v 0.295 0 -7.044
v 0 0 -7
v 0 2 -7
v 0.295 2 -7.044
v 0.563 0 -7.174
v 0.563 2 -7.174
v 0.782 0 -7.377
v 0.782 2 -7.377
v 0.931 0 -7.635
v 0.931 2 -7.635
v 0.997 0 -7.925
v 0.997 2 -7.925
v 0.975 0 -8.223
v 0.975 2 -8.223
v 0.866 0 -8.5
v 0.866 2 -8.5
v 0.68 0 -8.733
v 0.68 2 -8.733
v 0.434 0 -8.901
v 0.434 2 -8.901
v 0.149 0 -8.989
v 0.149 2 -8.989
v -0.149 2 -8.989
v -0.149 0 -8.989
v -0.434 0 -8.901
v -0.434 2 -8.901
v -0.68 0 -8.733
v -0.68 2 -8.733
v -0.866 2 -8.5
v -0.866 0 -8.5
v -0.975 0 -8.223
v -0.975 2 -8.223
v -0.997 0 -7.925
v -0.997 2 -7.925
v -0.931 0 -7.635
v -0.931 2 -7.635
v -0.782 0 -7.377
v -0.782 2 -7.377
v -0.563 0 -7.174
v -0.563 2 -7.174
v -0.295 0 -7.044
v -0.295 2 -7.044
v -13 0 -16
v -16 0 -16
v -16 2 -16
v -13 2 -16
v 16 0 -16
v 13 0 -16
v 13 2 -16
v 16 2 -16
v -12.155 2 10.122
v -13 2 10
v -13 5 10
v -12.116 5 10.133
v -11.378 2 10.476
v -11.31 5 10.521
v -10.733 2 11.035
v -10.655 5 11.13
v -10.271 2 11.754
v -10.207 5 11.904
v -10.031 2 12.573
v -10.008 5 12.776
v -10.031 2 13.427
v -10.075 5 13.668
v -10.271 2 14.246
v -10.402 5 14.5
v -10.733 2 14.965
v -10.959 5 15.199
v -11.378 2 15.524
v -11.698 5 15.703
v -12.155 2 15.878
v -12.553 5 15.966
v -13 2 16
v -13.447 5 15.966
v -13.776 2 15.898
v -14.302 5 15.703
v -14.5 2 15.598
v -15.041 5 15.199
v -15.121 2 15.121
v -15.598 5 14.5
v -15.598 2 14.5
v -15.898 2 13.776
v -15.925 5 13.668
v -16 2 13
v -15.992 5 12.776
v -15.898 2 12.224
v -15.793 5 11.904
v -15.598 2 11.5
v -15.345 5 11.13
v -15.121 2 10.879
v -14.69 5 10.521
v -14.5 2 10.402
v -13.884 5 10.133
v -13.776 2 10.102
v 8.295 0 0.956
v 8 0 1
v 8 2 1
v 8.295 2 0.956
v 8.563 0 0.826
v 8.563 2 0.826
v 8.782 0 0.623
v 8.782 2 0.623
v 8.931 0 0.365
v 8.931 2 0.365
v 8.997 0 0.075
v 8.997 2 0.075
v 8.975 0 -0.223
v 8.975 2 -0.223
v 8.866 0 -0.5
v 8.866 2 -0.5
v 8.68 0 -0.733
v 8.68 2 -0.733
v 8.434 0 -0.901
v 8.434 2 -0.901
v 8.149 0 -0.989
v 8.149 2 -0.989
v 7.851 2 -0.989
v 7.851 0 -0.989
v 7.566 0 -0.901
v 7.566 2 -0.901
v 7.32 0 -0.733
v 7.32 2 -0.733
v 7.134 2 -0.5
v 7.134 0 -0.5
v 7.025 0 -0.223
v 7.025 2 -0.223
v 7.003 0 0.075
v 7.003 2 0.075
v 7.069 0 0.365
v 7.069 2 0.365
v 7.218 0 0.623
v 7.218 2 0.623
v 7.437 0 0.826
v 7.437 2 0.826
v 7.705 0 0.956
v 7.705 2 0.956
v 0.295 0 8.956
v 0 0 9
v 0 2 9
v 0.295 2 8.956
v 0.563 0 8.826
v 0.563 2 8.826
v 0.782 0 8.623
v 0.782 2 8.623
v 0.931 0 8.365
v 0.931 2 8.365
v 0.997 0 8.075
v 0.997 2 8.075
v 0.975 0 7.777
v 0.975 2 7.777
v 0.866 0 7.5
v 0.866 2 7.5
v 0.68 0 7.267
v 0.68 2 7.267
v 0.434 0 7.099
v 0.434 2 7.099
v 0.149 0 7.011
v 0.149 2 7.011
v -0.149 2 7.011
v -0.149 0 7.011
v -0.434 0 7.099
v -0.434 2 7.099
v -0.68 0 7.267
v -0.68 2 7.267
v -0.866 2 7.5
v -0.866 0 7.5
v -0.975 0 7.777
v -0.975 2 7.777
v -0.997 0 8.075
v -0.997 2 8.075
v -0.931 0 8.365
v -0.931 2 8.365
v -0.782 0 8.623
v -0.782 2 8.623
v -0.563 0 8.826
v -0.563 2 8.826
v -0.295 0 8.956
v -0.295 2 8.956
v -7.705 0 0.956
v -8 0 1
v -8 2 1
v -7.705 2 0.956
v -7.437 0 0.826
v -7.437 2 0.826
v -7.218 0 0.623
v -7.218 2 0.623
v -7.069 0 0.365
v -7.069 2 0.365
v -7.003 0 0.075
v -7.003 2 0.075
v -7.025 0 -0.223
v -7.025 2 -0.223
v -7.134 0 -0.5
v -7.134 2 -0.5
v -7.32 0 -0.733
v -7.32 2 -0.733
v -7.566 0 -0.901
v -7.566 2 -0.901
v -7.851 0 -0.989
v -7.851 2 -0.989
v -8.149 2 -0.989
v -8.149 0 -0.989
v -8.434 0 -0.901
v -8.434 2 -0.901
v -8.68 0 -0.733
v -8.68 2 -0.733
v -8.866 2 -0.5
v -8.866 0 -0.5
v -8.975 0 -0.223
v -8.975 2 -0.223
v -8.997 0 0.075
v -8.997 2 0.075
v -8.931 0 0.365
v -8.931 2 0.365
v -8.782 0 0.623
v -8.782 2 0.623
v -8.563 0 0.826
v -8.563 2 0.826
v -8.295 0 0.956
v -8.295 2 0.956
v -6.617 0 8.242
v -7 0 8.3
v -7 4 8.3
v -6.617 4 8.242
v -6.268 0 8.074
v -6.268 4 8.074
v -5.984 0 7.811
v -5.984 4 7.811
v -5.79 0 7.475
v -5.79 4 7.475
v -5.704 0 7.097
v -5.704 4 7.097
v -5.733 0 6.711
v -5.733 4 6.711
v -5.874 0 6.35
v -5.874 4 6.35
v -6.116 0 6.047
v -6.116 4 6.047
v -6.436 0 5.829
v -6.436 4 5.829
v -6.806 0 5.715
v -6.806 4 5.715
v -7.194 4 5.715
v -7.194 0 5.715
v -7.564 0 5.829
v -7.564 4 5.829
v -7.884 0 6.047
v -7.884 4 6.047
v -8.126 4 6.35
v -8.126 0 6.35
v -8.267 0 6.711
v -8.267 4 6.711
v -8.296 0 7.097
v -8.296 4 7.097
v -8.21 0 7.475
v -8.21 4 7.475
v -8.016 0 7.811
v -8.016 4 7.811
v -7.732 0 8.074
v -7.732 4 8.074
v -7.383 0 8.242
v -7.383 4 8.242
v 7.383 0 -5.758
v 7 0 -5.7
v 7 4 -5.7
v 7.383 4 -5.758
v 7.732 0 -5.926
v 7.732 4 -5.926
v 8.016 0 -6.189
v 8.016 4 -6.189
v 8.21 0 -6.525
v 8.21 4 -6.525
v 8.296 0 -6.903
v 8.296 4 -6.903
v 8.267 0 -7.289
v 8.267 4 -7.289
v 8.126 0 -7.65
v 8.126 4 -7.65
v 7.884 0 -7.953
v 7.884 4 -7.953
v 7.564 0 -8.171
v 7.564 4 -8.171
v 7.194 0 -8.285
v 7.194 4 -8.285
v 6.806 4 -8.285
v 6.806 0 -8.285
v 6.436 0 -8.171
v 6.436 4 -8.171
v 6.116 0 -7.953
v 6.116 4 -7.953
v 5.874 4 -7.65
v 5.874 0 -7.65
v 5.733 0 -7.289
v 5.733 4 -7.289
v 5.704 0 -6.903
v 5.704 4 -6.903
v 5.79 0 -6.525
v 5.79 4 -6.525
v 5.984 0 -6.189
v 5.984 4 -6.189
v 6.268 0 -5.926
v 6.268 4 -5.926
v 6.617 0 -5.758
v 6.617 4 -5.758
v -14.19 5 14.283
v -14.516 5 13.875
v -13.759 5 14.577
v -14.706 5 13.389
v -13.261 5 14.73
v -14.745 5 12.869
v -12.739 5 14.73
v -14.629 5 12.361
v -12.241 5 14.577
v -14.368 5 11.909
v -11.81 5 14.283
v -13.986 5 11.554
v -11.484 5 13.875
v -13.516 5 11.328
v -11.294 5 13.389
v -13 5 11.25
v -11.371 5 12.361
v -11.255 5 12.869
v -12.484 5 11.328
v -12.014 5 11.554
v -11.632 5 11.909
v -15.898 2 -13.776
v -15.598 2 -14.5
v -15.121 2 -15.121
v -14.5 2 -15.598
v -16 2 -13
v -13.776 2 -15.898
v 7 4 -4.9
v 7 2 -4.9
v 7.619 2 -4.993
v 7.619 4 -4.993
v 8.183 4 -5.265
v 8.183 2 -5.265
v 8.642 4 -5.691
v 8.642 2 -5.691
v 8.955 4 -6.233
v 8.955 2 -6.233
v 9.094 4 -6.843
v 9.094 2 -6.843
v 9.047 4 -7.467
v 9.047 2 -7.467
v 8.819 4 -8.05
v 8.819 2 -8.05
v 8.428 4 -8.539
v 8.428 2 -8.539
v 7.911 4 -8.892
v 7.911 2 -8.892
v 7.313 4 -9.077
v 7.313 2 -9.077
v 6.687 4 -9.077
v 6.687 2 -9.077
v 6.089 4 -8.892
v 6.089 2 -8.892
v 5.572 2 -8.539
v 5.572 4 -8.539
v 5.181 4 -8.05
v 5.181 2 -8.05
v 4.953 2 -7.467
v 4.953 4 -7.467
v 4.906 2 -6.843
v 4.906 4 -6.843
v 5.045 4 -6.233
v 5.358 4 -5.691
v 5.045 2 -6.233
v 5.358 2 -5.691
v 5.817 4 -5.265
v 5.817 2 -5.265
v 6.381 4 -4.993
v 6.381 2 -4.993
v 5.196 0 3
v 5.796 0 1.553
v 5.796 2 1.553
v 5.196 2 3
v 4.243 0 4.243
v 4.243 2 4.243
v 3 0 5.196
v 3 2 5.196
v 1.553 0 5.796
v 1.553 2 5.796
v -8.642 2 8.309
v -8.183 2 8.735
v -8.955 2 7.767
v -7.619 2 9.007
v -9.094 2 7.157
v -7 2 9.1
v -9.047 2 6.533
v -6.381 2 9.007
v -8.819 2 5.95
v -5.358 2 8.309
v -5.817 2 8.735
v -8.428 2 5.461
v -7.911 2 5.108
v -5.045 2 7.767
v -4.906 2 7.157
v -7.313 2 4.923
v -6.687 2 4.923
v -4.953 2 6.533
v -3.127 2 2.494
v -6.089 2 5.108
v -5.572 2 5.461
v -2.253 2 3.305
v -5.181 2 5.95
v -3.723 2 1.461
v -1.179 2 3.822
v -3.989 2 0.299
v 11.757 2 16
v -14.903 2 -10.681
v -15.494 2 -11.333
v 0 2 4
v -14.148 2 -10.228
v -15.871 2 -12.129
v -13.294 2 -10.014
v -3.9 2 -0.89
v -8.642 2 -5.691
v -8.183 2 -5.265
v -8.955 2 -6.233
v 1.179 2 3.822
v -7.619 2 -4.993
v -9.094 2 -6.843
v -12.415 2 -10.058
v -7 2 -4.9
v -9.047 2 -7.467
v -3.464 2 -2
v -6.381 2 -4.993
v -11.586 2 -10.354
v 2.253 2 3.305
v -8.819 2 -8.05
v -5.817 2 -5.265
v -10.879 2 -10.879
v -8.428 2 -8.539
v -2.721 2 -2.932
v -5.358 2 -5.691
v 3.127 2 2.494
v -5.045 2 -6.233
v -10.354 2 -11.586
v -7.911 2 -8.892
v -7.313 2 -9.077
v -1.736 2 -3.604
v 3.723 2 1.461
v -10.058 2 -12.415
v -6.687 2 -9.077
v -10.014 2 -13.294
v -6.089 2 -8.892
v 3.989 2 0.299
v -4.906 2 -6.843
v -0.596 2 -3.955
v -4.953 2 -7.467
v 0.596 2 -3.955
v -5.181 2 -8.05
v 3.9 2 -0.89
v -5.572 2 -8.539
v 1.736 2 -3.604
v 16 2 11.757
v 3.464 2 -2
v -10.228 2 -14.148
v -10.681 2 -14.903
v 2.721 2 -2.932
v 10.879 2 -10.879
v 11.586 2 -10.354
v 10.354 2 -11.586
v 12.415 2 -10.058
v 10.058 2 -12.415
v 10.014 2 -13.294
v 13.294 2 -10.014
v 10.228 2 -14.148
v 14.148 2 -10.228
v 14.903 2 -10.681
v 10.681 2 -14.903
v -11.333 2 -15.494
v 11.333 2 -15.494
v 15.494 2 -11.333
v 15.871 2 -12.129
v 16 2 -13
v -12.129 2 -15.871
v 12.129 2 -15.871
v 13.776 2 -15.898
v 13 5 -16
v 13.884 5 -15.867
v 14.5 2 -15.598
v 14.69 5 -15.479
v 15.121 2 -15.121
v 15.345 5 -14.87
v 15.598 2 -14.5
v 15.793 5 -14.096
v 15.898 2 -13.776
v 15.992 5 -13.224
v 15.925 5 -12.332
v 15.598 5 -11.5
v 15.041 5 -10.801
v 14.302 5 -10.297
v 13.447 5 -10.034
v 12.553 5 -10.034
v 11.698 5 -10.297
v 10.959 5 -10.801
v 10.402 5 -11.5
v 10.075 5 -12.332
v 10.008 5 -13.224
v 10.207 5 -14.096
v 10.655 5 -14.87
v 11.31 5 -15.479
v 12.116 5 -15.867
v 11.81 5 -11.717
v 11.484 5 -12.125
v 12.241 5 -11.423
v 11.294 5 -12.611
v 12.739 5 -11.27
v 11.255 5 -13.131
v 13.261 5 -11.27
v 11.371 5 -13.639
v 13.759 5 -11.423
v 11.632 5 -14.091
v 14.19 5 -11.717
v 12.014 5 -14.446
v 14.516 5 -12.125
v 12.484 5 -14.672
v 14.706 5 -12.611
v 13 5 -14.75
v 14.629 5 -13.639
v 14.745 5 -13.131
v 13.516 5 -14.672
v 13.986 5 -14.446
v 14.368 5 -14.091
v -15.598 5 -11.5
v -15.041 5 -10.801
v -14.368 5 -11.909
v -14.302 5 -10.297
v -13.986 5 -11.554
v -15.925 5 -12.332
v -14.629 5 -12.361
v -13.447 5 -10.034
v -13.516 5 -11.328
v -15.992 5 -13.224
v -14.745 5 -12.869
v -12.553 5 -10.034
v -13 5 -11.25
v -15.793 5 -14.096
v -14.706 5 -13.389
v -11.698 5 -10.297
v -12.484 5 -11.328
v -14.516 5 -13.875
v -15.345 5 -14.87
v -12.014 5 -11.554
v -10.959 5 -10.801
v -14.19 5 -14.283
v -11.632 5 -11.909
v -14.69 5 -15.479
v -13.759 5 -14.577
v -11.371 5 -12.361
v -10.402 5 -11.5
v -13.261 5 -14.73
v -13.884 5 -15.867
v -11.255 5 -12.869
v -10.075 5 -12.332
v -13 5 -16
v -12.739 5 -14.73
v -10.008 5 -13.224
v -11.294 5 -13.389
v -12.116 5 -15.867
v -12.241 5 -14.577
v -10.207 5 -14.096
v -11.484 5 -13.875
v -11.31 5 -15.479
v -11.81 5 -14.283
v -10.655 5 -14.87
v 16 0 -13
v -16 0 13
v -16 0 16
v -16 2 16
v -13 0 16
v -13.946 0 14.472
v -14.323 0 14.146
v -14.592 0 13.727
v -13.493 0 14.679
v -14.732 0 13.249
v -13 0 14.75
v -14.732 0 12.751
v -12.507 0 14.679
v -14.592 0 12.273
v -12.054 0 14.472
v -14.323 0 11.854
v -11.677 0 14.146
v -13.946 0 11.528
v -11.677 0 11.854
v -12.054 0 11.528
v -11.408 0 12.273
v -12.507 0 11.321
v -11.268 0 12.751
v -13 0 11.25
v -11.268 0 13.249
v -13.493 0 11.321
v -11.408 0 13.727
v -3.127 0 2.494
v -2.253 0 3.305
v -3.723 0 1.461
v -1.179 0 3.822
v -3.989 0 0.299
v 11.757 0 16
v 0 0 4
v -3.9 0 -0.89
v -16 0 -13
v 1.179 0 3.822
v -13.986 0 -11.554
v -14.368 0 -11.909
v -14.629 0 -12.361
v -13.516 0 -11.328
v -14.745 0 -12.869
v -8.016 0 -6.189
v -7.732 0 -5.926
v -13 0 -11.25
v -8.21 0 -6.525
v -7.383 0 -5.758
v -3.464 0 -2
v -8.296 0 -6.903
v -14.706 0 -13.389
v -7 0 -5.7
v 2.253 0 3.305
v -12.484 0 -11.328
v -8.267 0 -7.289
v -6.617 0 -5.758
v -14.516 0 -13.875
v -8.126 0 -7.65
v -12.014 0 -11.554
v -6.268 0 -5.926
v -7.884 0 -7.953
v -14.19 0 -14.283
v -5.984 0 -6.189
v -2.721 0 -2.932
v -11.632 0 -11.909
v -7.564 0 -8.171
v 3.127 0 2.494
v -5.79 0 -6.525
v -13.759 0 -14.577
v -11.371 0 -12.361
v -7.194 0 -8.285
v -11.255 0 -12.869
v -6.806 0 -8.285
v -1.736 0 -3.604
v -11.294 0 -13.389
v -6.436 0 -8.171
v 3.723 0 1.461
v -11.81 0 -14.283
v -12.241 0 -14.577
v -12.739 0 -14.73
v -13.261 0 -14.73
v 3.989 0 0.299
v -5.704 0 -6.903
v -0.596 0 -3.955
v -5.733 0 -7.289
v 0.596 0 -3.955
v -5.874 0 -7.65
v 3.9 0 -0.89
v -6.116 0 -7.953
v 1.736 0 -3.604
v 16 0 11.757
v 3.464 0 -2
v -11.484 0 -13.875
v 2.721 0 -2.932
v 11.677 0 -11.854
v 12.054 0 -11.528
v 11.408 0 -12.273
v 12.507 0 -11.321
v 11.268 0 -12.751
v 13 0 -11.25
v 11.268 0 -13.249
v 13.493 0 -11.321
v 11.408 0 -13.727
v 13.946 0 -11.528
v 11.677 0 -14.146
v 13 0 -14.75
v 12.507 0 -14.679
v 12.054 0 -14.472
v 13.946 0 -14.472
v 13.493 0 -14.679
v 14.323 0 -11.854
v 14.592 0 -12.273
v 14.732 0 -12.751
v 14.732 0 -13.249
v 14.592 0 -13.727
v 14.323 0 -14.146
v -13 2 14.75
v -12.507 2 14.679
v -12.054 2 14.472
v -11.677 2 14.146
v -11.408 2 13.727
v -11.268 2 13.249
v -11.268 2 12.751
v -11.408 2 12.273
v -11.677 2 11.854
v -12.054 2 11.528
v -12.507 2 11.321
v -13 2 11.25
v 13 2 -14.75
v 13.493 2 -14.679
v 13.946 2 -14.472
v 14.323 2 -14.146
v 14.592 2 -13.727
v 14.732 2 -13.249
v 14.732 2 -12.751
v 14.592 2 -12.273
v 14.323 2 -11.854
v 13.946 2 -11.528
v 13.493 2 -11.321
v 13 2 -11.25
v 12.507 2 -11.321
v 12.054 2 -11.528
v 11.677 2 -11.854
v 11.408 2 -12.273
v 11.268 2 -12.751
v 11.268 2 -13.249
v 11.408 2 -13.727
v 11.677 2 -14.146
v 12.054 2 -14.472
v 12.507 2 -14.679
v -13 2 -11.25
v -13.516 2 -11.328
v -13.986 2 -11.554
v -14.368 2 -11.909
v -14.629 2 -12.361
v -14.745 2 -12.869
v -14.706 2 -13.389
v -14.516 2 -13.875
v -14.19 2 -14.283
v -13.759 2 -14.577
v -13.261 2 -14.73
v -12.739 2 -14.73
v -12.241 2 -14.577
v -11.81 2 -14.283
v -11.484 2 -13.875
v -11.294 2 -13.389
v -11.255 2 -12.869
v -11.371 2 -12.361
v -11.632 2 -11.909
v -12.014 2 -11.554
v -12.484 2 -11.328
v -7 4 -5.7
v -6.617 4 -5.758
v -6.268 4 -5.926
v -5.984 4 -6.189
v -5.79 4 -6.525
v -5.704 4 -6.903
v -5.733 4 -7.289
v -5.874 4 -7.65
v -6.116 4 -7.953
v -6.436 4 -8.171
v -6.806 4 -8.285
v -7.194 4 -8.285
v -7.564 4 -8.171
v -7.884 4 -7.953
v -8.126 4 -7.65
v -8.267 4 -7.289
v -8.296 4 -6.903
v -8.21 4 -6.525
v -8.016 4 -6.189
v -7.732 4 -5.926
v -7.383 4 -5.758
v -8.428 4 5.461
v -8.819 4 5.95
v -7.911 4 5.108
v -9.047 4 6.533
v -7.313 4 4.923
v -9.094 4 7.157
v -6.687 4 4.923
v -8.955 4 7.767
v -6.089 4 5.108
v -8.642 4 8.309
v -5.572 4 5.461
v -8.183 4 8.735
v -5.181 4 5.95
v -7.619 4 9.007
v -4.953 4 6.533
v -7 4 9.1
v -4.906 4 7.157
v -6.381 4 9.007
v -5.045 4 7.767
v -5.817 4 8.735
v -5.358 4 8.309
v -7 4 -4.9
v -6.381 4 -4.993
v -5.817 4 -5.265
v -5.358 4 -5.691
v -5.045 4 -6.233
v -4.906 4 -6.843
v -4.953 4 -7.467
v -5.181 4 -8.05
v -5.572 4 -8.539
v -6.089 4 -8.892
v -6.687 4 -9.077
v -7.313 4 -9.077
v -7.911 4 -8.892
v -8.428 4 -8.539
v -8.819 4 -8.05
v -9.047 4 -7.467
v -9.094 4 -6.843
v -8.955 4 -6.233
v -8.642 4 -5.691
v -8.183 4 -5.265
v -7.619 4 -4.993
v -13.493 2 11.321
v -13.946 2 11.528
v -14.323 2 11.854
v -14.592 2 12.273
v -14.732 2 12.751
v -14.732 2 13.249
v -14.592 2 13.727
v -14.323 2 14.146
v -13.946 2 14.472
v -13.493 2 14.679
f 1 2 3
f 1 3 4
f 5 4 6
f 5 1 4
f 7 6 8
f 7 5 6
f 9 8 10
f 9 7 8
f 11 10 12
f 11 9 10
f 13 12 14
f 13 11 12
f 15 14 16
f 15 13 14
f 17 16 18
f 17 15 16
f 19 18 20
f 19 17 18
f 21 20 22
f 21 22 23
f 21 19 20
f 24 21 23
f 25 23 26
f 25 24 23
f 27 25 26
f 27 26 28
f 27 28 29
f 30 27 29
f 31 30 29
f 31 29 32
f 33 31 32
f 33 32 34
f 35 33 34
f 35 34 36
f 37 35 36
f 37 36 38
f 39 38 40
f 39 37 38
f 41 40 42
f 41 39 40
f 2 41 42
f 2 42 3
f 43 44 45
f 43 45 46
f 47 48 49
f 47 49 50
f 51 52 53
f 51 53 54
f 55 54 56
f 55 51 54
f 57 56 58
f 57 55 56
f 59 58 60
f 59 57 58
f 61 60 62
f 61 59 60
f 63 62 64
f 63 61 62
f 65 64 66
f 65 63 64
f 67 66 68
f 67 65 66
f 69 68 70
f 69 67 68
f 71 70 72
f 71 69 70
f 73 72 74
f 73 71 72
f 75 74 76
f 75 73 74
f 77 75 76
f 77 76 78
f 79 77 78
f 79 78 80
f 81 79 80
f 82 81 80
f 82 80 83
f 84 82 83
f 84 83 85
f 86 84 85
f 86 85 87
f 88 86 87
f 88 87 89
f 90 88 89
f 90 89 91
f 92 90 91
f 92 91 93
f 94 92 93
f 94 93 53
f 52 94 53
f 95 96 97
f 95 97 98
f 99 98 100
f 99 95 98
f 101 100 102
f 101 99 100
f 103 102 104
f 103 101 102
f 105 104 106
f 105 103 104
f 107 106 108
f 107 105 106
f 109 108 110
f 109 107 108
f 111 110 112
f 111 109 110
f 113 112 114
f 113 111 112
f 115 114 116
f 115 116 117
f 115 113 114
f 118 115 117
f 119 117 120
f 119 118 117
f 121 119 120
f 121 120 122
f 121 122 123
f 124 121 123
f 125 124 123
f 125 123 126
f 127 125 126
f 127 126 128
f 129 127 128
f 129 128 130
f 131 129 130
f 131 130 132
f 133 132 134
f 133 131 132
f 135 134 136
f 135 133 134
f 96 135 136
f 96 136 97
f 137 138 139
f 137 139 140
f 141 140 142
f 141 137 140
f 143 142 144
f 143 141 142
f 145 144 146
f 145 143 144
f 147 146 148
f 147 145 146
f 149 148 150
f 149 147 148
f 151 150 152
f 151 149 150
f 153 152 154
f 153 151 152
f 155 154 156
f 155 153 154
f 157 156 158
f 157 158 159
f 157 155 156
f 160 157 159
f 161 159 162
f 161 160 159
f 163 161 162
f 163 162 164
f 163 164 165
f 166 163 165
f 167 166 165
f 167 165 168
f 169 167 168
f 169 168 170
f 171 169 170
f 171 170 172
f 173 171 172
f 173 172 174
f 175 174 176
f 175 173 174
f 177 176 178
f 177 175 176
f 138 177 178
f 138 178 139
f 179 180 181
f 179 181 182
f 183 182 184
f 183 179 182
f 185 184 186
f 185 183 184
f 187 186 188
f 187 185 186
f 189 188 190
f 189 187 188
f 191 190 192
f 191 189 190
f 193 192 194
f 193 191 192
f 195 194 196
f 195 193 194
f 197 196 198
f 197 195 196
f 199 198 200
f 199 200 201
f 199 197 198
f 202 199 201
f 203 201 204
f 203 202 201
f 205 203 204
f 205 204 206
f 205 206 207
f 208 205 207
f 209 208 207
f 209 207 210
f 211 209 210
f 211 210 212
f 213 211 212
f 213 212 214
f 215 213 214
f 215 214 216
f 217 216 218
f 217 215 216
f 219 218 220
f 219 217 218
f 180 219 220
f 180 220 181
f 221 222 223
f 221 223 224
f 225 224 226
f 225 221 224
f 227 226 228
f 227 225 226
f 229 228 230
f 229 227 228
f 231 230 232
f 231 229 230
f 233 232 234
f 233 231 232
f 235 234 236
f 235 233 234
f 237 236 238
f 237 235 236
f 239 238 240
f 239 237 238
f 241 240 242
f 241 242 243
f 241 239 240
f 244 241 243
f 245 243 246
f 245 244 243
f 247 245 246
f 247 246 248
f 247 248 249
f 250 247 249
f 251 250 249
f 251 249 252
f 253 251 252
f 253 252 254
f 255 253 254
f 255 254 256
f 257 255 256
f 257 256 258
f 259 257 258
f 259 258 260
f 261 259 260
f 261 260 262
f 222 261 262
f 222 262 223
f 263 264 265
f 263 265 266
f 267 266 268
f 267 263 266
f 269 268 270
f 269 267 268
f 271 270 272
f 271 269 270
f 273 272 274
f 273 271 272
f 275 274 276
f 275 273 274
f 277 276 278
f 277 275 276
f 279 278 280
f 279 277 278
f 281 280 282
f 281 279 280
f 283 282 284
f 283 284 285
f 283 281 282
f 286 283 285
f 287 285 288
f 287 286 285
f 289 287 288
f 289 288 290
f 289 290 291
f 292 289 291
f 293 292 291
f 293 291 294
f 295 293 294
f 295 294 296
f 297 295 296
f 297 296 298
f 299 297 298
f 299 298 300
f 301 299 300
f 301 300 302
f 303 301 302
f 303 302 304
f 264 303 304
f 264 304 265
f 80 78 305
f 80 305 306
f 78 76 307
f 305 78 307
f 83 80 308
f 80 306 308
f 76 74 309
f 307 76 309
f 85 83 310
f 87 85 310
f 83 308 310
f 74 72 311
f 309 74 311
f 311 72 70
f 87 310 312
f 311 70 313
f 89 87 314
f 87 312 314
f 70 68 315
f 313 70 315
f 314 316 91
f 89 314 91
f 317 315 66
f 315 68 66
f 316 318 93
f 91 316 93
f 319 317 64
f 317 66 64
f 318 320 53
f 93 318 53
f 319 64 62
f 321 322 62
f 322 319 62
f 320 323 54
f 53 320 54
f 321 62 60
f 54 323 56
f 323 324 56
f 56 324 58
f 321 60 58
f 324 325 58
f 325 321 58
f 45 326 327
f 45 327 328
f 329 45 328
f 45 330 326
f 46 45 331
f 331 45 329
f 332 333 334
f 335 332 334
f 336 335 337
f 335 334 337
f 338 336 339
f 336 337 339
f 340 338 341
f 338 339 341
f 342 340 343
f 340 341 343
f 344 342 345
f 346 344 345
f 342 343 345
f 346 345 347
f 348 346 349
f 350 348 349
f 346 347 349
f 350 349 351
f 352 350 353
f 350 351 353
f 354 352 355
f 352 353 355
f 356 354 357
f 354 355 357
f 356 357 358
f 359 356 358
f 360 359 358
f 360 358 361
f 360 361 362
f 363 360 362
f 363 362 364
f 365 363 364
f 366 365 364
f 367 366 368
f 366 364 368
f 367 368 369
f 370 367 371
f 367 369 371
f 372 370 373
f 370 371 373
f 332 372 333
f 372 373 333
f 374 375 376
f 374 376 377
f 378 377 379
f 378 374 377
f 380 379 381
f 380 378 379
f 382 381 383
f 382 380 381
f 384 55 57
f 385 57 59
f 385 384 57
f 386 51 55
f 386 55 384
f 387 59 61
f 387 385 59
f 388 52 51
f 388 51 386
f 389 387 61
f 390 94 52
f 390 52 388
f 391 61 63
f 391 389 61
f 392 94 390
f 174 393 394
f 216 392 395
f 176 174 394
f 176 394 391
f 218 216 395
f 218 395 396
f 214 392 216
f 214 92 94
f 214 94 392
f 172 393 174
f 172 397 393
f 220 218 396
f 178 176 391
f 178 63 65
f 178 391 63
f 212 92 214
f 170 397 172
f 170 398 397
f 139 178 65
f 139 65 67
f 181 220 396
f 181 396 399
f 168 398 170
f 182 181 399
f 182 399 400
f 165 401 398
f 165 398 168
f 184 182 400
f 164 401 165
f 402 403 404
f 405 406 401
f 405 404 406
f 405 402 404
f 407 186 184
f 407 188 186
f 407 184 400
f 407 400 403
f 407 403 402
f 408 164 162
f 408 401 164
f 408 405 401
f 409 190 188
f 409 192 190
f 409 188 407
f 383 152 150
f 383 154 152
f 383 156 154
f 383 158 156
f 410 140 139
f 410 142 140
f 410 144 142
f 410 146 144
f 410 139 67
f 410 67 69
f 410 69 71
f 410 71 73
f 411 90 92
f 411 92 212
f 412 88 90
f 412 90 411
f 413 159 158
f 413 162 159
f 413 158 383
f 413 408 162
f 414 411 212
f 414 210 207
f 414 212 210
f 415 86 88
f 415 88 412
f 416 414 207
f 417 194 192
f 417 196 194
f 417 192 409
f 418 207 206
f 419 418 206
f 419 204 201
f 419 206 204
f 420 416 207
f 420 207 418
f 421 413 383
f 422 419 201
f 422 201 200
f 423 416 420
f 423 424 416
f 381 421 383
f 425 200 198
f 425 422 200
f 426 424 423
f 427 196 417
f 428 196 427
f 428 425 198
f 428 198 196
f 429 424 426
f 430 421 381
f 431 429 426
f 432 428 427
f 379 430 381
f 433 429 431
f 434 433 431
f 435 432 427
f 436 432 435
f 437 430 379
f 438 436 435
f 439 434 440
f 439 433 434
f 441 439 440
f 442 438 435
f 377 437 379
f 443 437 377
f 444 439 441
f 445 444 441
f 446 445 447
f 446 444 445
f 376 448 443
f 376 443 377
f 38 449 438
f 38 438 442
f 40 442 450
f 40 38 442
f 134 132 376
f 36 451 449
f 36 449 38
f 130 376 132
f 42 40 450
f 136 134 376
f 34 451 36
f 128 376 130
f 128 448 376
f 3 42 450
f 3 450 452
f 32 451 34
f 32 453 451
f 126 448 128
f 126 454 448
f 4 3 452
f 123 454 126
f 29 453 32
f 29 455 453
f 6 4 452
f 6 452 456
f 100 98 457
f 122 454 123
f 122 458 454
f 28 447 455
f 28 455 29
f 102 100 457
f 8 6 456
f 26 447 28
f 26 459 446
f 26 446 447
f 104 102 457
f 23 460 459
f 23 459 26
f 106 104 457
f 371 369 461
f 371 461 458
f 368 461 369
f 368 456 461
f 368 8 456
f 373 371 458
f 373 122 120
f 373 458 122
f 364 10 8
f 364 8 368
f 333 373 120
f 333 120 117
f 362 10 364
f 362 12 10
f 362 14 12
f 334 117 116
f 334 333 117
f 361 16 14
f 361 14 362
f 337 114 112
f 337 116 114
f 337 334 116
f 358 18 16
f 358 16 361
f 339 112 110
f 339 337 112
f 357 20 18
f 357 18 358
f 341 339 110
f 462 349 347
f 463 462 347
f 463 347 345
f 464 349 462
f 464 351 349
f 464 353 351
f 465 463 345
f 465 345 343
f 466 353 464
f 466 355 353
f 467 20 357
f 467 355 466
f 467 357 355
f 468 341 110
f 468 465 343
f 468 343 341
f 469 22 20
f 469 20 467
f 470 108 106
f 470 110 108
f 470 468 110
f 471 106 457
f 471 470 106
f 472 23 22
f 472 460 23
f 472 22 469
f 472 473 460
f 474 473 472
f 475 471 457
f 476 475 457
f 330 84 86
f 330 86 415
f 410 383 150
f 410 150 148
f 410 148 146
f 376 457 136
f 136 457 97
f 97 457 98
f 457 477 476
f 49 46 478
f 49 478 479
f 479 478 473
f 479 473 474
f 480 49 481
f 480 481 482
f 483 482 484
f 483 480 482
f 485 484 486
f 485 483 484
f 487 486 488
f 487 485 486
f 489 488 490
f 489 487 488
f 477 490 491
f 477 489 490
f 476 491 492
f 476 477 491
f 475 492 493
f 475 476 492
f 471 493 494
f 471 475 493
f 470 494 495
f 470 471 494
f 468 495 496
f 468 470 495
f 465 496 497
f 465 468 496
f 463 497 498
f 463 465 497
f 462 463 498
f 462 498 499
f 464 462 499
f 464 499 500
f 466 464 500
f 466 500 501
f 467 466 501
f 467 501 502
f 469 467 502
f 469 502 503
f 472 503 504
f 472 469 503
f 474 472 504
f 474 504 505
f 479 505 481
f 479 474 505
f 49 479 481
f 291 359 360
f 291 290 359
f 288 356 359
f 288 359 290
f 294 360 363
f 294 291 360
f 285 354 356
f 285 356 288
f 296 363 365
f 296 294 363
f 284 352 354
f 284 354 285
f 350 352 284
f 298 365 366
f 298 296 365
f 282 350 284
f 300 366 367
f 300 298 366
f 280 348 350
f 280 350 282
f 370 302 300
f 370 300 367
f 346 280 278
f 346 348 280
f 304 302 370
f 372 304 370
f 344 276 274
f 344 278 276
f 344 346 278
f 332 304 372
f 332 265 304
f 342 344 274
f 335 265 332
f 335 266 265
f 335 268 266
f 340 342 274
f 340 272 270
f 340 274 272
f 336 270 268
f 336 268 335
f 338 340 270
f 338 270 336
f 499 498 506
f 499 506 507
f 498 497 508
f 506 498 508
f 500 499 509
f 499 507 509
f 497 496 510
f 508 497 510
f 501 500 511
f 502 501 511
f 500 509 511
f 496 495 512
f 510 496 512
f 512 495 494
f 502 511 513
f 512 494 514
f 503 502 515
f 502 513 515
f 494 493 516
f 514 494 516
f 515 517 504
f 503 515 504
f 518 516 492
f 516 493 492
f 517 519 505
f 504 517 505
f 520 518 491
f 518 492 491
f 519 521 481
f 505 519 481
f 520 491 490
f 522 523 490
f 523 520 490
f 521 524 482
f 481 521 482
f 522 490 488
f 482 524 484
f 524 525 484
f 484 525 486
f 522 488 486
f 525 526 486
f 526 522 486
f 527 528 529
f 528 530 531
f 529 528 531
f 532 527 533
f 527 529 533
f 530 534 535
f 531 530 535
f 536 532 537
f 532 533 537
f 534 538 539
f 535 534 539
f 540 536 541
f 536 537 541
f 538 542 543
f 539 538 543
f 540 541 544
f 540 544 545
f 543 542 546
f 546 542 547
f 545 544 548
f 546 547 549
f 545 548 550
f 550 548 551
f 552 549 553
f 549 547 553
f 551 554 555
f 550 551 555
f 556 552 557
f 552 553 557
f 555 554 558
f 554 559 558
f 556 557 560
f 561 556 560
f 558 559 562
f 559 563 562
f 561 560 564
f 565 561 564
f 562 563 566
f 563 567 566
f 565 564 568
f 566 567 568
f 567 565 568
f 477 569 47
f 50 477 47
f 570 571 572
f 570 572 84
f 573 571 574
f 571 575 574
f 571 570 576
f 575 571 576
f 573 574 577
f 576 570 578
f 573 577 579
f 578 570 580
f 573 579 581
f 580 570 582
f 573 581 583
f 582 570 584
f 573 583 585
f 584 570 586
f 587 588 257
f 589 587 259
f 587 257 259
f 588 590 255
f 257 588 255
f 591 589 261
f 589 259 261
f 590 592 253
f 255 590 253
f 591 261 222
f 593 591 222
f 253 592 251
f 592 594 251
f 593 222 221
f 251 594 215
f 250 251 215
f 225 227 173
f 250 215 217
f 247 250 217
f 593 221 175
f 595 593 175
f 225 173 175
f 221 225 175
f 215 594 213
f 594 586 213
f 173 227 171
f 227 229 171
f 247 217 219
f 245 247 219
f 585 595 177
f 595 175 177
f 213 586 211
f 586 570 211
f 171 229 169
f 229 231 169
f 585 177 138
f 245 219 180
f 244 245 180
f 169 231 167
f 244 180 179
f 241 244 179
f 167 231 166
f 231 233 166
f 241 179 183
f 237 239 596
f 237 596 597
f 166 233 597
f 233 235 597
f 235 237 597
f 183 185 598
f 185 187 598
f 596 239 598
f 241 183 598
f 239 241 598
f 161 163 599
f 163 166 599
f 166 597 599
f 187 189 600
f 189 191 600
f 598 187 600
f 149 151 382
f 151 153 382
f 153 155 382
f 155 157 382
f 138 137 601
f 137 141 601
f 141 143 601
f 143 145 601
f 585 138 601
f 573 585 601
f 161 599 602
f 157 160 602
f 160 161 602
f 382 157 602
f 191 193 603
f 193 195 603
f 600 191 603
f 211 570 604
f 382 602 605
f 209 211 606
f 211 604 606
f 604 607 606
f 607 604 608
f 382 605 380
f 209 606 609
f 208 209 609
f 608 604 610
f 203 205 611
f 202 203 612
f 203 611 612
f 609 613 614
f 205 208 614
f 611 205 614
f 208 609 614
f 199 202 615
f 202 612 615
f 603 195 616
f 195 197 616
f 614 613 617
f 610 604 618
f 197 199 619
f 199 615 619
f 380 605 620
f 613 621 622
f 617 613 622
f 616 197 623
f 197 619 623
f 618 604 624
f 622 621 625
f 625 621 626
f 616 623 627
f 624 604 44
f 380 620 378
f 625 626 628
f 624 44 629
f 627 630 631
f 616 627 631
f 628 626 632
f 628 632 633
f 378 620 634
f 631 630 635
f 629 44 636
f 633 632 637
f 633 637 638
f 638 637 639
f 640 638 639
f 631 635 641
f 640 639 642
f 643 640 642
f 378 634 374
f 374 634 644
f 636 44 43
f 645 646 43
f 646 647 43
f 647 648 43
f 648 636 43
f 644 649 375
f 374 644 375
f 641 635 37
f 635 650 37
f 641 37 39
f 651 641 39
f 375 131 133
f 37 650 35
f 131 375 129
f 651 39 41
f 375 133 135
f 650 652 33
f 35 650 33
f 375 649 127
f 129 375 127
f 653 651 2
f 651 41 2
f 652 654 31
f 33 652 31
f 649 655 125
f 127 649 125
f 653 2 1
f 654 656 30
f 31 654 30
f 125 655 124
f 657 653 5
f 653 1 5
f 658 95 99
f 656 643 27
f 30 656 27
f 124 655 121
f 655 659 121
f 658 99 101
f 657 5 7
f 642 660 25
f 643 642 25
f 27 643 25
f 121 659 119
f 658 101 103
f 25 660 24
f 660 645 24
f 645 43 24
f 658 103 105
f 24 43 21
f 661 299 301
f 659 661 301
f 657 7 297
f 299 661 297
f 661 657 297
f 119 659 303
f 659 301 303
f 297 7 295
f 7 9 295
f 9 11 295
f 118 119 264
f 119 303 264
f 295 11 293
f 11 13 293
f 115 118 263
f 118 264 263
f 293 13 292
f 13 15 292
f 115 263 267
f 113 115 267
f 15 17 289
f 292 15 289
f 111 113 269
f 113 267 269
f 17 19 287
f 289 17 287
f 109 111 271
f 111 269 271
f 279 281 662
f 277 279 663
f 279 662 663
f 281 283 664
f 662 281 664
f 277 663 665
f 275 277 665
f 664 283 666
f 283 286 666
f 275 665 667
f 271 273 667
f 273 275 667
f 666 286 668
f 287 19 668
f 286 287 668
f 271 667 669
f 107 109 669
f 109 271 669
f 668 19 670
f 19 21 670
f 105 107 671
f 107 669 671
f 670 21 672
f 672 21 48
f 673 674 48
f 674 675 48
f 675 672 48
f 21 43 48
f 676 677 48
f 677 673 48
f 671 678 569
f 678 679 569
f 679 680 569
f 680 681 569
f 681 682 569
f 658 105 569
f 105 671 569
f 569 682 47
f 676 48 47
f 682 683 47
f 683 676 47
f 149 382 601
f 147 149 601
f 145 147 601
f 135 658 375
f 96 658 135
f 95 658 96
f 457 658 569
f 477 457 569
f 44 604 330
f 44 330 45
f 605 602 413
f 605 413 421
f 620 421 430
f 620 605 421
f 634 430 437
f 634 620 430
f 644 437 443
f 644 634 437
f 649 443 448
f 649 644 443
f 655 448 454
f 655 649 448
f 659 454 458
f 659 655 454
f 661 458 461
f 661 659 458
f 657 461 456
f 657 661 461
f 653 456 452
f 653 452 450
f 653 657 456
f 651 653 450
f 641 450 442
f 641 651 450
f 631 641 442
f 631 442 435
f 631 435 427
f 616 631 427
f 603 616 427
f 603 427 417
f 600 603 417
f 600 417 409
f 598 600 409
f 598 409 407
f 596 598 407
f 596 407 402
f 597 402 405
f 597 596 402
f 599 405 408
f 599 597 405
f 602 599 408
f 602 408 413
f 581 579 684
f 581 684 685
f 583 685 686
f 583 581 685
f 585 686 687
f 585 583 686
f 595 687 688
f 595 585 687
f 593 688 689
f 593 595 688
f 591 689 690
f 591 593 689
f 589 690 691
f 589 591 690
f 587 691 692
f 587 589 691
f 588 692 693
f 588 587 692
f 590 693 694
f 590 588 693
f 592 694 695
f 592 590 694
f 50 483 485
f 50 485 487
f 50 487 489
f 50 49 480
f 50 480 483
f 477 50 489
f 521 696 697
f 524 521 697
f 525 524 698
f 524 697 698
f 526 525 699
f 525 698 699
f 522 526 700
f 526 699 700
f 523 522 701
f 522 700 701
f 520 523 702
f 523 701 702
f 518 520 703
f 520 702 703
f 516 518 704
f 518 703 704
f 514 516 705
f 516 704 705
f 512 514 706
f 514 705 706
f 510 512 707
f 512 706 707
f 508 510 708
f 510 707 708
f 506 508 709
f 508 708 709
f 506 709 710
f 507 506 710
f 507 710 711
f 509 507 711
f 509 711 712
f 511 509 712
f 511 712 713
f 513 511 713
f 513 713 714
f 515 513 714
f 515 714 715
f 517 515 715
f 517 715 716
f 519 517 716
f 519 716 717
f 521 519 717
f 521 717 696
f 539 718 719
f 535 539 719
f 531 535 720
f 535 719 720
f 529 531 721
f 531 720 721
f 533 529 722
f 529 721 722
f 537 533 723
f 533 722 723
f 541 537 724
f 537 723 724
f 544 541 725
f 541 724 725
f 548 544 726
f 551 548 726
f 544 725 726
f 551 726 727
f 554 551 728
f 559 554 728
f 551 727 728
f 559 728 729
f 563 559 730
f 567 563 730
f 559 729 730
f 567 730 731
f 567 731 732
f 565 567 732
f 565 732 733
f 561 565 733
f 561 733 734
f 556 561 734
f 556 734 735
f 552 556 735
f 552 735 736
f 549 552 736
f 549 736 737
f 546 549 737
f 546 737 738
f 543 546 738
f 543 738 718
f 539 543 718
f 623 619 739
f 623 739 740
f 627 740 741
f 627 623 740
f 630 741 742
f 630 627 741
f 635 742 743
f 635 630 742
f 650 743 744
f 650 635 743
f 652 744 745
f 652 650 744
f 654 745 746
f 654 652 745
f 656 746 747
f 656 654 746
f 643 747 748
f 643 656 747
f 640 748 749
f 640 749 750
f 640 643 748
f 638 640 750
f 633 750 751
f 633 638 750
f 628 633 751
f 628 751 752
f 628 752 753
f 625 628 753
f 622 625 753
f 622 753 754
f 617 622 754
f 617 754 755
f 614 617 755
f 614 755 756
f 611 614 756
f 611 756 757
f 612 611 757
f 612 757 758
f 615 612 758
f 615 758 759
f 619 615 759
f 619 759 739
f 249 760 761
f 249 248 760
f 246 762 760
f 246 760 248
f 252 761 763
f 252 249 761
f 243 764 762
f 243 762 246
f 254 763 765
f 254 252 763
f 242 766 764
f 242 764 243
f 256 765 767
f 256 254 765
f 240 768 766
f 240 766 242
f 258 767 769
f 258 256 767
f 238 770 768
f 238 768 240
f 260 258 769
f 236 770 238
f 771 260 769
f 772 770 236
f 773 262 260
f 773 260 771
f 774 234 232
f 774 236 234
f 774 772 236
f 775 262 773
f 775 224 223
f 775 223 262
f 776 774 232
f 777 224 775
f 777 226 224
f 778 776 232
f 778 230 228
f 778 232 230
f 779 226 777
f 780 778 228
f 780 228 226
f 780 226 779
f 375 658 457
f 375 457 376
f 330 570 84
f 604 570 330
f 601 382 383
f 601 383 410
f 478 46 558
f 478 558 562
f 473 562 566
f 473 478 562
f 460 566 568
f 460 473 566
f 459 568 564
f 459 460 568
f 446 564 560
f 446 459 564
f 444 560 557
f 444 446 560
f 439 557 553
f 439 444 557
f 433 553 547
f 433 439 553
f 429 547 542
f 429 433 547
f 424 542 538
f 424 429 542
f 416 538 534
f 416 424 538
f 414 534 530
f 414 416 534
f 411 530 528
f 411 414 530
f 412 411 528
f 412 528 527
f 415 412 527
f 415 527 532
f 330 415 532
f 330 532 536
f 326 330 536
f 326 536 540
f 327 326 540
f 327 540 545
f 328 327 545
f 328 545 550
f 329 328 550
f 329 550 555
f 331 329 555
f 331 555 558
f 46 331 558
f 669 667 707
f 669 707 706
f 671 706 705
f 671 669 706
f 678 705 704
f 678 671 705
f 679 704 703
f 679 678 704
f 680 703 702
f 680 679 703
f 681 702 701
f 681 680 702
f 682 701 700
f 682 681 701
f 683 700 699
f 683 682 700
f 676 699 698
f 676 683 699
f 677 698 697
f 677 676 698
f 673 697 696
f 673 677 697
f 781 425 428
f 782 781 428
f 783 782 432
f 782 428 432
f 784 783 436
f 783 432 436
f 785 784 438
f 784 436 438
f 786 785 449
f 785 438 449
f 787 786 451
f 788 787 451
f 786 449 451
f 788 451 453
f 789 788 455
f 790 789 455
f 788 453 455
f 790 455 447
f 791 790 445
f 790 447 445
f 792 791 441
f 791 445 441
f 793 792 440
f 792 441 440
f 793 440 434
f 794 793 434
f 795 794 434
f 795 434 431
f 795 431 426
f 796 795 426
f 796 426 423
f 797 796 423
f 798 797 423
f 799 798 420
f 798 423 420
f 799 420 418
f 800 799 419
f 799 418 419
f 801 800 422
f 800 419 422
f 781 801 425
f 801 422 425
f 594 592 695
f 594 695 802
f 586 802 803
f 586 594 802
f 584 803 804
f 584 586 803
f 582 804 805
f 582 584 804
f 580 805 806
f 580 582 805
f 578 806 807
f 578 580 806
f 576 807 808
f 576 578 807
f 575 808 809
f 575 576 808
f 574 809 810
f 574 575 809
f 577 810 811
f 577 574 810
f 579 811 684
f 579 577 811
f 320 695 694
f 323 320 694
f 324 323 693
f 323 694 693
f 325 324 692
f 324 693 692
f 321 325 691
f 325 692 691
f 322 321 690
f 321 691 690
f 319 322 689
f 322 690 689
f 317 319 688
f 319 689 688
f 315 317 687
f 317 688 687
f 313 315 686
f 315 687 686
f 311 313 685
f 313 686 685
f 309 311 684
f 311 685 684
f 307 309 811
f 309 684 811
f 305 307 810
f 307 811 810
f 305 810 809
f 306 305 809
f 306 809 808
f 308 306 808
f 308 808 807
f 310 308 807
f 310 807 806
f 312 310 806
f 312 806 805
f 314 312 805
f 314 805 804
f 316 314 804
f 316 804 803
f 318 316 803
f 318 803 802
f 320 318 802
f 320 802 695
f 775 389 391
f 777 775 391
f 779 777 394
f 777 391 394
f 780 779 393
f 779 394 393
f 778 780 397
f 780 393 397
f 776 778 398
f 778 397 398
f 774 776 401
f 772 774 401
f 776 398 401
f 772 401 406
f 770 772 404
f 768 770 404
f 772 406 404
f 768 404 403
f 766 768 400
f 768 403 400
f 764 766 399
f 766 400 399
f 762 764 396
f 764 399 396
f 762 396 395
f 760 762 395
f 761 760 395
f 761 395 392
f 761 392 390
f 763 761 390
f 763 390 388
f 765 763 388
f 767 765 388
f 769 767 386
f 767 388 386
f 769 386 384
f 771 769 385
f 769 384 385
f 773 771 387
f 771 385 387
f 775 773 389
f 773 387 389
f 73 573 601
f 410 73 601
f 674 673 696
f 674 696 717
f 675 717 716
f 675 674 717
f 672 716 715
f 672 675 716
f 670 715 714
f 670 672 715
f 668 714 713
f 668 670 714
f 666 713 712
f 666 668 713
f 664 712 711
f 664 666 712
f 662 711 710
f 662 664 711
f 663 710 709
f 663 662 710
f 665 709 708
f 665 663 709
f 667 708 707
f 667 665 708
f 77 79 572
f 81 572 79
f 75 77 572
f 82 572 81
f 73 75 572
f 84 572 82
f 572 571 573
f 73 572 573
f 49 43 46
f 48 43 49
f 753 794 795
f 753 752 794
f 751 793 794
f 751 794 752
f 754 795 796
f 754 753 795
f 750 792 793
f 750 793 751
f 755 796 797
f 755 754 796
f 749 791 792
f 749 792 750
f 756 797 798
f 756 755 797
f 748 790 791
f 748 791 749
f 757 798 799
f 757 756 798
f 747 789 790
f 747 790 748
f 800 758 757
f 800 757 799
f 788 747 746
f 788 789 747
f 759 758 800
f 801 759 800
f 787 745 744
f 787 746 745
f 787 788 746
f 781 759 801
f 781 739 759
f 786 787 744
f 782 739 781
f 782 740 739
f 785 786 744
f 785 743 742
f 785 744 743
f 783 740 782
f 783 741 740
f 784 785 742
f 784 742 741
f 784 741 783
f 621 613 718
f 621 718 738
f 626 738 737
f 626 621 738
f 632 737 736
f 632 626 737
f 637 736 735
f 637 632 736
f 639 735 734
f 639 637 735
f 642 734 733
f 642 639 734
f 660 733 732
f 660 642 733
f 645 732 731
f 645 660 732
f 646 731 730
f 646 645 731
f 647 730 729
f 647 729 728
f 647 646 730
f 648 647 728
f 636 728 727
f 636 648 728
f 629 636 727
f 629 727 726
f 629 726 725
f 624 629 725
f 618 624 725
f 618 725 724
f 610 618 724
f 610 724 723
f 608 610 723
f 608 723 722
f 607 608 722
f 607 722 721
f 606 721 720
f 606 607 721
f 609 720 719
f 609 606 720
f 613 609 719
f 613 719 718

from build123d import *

# Parameters (mm, degrees)
SKETCH_1_W          = 32
SKETCH_1_H          = 32
SKETCH_1_R          = 1
SKETCH_1_R_2        = 4
SKETCH_1_R_3        = 1.75
EXTRUDE_1_DEPTH     = 2
SKETCH_2_R          = 2.1
SKETCH_2_R_2        = 1.3
EXTRUDE_3_DEPTH     = 2
CUT_EXTRUDE_START   = -2
SKETCH_2_6_R        = 1.3
SKETCH_2_6_R_2      = 1.75
SKETCH_2_6_R_3      = 2.1
CUT_EXTRUDE_2_DEPTH = 2
SKETCH_3_R          = 3
SKETCH_3_R_2        = 1.75
EXTRUDE_5_DEPTH     = 5


with BuildPart() as part:
    # 草图1 → 凸台-拉伸1 (new body)
    with BuildSketch(Plane(origin=(0, 0, 0), x_dir=(1, 0, 0), z_dir=(0, 1, 0))):
        Rectangle(SKETCH_1_W, SKETCH_1_H)
        with Locations(Location((8, 0, 0), (0, 0, 270))):
            Circle(SKETCH_1_R, mode=Mode.SUBTRACT)
        with Locations(Location((0, -8, 0), (0, 0, 270))):
            Circle(SKETCH_1_R, mode=Mode.SUBTRACT)
        with Locations(Location((-8, 0, 0), (0, 0, 270))):
            Circle(SKETCH_1_R, mode=Mode.SUBTRACT)
        with Locations(Location((0, 8, 0), (0, 0, 270))):
            Circle(SKETCH_1_R, mode=Mode.SUBTRACT)
        with Locations(Location((0, 0, 0), (0, 0, 270))):
            Circle(SKETCH_1_R_2, mode=Mode.SUBTRACT)
        with Locations(Location((13, 13, 0), (0, 0, 270))):
            Circle(SKETCH_1_R_3, mode=Mode.SUBTRACT)
        with Locations(Location((-13, 13, 0), (0, 0, 270))):
            Circle(SKETCH_1_R_3, mode=Mode.SUBTRACT)
        with Locations(Location((13, -13, 0), (0, 0, 270))):
            Circle(SKETCH_1_R_3, mode=Mode.SUBTRACT)
        with Locations(Location((-13, -13, 0), (0, 0, 270))):
            Circle(SKETCH_1_R_3, mode=Mode.SUBTRACT)
    extrude(amount=EXTRUDE_1_DEPTH)

    # 草图2 → 凸台-拉伸3 (add)
    # profile 1 of 3: a face of its own
    with BuildSketch(Plane(origin=(0, 2, 0), x_dir=(1, 0, 0), z_dir=(0, 1, 0))):
        with Locations(Location((-7, -7, 0), (0, 0, 270))):
            Circle(SKETCH_2_R)
        with Locations(Location((-7, -7, 0), (0, 0, 270))):
            Circle(SKETCH_2_R_2, mode=Mode.SUBTRACT)
    # profile 2 of 3: a face of its own
    with BuildSketch(Plane(origin=(0, 2, 0), x_dir=(1, 0, 0), z_dir=(0, 1, 0))):
        with Locations(Location((-7, 7, 0), (0, 0, 270))):
            Circle(SKETCH_2_R)
        with Locations(Location((-7, 7, 0), (0, 0, 270))):
            Circle(SKETCH_2_R_2, mode=Mode.SUBTRACT)
    # profile 3 of 3: a face of its own
    with BuildSketch(Plane(origin=(0, 2, 0), x_dir=(1, 0, 0), z_dir=(0, 1, 0))):
        with Locations(Location((7, 7, 0), (0, 0, 270))):
            Circle(SKETCH_2_R)
        with Locations(Location((7, 7, 0), (0, 0, 270))):
            Circle(SKETCH_2_R_2, mode=Mode.SUBTRACT)
    extrude(amount=EXTRUDE_3_DEPTH)

    # 草图2<6> → 切除-拉伸2 (cut)
    # profile 1 of 6: a face of its own
    with BuildSketch(Plane(origin=(0, 2, 0), x_dir=(1, 0, 0), z_dir=(0, 1, 0)).offset(CUT_EXTRUDE_START)):
        with Locations(Location((-7, 7, 0), (0, 0, 270))):
            Circle(SKETCH_2_6_R)
    # profile 2 of 6: a face of its own
    with BuildSketch(Plane(origin=(0, 2, 0), x_dir=(1, 0, 0), z_dir=(0, 1, 0)).offset(CUT_EXTRUDE_START)):
        with Locations(Location((-7, -7, 0), (0, 0, 270))):
            Circle(SKETCH_2_6_R)
    # profile 3 of 6: a face of its own
    with BuildSketch(Plane(origin=(0, 2, 0), x_dir=(1, 0, 0), z_dir=(0, 1, 0)).offset(CUT_EXTRUDE_START)):
        with Locations(Location((7, 7, 0), (0, 0, 270))):
            Circle(SKETCH_2_6_R)
    # profile 4 of 6: a face of its own
    with BuildSketch(Plane(origin=(0, 2, 0), x_dir=(1, 0, 0), z_dir=(0, 1, 0)).offset(CUT_EXTRUDE_START)):
        with BuildLine():
            Line((16, -11.757359313), (5.795554958, -1.552914271))
            ThreePointArc((5.795554958, -1.552914271), (4.242640687, -4.242640687), (1.552914271, -5.795554958))
            Line((1.552914271, -5.795554958), (11.757359313, -16))
            Line((11.757359313, -16), (16, -16))
            Line((16, -16), (16, -11.757359313))
        make_face()
        with Locations((13, -13)):
            Circle(SKETCH_2_6_R_2, mode=Mode.SUBTRACT)
        with Locations((7, -7)):
            Circle(SKETCH_2_6_R_3, mode=Mode.SUBTRACT)
    # profile 5 of 6: a face of its own
    with BuildSketch(Plane(origin=(0, 2, 0), x_dir=(1, 0, 0), z_dir=(0, 1, 0)).offset(CUT_EXTRUDE_START)):
        with Locations((7, -7)):
            Circle(SKETCH_2_6_R_3)
        with Locations((7, -7)):
            Circle(SKETCH_2_6_R, mode=Mode.SUBTRACT)
    # profile 6 of 6: a face of its own
    with BuildSketch(Plane(origin=(0, 2, 0), x_dir=(1, 0, 0), z_dir=(0, 1, 0)).offset(CUT_EXTRUDE_START)):
        with Locations((7, -7)):
            Circle(SKETCH_2_6_R)
    extrude(amount=CUT_EXTRUDE_2_DEPTH, mode=Mode.SUBTRACT)

    # 草图3 → 凸台-拉伸5 (add)
    # profile 1 of 3: a face of its own
    with BuildSketch(Plane.XZ):
        with Locations(Location((-13, 13, 0), (0, 0, 270))):
            Circle(SKETCH_3_R)
        with Locations(Location((-13, 13, 0), (0, 0, 270))):
            Circle(SKETCH_3_R_2, mode=Mode.SUBTRACT)
    # profile 2 of 3: a face of its own
    with BuildSketch(Plane.XZ):
        with Locations(Location((-13, -13, 0), (0, 0, 270))):
            Circle(SKETCH_3_R)
        with Locations(Location((-13, -13, 0), (0, 0, 90))):
            Circle(SKETCH_3_R_2, mode=Mode.SUBTRACT)
    # profile 3 of 3: a face of its own
    with BuildSketch(Plane.XZ):
        with Locations(Location((13, -13, 0), (0, 0, 270))):
            Circle(SKETCH_3_R)
        with Locations(Location((13, -13, 0), (0, 0, 270))):
            Circle(SKETCH_3_R_2, mode=Mode.SUBTRACT)
    extrude(amount=-EXTRUDE_5_DEPTH)


solid = part.part
